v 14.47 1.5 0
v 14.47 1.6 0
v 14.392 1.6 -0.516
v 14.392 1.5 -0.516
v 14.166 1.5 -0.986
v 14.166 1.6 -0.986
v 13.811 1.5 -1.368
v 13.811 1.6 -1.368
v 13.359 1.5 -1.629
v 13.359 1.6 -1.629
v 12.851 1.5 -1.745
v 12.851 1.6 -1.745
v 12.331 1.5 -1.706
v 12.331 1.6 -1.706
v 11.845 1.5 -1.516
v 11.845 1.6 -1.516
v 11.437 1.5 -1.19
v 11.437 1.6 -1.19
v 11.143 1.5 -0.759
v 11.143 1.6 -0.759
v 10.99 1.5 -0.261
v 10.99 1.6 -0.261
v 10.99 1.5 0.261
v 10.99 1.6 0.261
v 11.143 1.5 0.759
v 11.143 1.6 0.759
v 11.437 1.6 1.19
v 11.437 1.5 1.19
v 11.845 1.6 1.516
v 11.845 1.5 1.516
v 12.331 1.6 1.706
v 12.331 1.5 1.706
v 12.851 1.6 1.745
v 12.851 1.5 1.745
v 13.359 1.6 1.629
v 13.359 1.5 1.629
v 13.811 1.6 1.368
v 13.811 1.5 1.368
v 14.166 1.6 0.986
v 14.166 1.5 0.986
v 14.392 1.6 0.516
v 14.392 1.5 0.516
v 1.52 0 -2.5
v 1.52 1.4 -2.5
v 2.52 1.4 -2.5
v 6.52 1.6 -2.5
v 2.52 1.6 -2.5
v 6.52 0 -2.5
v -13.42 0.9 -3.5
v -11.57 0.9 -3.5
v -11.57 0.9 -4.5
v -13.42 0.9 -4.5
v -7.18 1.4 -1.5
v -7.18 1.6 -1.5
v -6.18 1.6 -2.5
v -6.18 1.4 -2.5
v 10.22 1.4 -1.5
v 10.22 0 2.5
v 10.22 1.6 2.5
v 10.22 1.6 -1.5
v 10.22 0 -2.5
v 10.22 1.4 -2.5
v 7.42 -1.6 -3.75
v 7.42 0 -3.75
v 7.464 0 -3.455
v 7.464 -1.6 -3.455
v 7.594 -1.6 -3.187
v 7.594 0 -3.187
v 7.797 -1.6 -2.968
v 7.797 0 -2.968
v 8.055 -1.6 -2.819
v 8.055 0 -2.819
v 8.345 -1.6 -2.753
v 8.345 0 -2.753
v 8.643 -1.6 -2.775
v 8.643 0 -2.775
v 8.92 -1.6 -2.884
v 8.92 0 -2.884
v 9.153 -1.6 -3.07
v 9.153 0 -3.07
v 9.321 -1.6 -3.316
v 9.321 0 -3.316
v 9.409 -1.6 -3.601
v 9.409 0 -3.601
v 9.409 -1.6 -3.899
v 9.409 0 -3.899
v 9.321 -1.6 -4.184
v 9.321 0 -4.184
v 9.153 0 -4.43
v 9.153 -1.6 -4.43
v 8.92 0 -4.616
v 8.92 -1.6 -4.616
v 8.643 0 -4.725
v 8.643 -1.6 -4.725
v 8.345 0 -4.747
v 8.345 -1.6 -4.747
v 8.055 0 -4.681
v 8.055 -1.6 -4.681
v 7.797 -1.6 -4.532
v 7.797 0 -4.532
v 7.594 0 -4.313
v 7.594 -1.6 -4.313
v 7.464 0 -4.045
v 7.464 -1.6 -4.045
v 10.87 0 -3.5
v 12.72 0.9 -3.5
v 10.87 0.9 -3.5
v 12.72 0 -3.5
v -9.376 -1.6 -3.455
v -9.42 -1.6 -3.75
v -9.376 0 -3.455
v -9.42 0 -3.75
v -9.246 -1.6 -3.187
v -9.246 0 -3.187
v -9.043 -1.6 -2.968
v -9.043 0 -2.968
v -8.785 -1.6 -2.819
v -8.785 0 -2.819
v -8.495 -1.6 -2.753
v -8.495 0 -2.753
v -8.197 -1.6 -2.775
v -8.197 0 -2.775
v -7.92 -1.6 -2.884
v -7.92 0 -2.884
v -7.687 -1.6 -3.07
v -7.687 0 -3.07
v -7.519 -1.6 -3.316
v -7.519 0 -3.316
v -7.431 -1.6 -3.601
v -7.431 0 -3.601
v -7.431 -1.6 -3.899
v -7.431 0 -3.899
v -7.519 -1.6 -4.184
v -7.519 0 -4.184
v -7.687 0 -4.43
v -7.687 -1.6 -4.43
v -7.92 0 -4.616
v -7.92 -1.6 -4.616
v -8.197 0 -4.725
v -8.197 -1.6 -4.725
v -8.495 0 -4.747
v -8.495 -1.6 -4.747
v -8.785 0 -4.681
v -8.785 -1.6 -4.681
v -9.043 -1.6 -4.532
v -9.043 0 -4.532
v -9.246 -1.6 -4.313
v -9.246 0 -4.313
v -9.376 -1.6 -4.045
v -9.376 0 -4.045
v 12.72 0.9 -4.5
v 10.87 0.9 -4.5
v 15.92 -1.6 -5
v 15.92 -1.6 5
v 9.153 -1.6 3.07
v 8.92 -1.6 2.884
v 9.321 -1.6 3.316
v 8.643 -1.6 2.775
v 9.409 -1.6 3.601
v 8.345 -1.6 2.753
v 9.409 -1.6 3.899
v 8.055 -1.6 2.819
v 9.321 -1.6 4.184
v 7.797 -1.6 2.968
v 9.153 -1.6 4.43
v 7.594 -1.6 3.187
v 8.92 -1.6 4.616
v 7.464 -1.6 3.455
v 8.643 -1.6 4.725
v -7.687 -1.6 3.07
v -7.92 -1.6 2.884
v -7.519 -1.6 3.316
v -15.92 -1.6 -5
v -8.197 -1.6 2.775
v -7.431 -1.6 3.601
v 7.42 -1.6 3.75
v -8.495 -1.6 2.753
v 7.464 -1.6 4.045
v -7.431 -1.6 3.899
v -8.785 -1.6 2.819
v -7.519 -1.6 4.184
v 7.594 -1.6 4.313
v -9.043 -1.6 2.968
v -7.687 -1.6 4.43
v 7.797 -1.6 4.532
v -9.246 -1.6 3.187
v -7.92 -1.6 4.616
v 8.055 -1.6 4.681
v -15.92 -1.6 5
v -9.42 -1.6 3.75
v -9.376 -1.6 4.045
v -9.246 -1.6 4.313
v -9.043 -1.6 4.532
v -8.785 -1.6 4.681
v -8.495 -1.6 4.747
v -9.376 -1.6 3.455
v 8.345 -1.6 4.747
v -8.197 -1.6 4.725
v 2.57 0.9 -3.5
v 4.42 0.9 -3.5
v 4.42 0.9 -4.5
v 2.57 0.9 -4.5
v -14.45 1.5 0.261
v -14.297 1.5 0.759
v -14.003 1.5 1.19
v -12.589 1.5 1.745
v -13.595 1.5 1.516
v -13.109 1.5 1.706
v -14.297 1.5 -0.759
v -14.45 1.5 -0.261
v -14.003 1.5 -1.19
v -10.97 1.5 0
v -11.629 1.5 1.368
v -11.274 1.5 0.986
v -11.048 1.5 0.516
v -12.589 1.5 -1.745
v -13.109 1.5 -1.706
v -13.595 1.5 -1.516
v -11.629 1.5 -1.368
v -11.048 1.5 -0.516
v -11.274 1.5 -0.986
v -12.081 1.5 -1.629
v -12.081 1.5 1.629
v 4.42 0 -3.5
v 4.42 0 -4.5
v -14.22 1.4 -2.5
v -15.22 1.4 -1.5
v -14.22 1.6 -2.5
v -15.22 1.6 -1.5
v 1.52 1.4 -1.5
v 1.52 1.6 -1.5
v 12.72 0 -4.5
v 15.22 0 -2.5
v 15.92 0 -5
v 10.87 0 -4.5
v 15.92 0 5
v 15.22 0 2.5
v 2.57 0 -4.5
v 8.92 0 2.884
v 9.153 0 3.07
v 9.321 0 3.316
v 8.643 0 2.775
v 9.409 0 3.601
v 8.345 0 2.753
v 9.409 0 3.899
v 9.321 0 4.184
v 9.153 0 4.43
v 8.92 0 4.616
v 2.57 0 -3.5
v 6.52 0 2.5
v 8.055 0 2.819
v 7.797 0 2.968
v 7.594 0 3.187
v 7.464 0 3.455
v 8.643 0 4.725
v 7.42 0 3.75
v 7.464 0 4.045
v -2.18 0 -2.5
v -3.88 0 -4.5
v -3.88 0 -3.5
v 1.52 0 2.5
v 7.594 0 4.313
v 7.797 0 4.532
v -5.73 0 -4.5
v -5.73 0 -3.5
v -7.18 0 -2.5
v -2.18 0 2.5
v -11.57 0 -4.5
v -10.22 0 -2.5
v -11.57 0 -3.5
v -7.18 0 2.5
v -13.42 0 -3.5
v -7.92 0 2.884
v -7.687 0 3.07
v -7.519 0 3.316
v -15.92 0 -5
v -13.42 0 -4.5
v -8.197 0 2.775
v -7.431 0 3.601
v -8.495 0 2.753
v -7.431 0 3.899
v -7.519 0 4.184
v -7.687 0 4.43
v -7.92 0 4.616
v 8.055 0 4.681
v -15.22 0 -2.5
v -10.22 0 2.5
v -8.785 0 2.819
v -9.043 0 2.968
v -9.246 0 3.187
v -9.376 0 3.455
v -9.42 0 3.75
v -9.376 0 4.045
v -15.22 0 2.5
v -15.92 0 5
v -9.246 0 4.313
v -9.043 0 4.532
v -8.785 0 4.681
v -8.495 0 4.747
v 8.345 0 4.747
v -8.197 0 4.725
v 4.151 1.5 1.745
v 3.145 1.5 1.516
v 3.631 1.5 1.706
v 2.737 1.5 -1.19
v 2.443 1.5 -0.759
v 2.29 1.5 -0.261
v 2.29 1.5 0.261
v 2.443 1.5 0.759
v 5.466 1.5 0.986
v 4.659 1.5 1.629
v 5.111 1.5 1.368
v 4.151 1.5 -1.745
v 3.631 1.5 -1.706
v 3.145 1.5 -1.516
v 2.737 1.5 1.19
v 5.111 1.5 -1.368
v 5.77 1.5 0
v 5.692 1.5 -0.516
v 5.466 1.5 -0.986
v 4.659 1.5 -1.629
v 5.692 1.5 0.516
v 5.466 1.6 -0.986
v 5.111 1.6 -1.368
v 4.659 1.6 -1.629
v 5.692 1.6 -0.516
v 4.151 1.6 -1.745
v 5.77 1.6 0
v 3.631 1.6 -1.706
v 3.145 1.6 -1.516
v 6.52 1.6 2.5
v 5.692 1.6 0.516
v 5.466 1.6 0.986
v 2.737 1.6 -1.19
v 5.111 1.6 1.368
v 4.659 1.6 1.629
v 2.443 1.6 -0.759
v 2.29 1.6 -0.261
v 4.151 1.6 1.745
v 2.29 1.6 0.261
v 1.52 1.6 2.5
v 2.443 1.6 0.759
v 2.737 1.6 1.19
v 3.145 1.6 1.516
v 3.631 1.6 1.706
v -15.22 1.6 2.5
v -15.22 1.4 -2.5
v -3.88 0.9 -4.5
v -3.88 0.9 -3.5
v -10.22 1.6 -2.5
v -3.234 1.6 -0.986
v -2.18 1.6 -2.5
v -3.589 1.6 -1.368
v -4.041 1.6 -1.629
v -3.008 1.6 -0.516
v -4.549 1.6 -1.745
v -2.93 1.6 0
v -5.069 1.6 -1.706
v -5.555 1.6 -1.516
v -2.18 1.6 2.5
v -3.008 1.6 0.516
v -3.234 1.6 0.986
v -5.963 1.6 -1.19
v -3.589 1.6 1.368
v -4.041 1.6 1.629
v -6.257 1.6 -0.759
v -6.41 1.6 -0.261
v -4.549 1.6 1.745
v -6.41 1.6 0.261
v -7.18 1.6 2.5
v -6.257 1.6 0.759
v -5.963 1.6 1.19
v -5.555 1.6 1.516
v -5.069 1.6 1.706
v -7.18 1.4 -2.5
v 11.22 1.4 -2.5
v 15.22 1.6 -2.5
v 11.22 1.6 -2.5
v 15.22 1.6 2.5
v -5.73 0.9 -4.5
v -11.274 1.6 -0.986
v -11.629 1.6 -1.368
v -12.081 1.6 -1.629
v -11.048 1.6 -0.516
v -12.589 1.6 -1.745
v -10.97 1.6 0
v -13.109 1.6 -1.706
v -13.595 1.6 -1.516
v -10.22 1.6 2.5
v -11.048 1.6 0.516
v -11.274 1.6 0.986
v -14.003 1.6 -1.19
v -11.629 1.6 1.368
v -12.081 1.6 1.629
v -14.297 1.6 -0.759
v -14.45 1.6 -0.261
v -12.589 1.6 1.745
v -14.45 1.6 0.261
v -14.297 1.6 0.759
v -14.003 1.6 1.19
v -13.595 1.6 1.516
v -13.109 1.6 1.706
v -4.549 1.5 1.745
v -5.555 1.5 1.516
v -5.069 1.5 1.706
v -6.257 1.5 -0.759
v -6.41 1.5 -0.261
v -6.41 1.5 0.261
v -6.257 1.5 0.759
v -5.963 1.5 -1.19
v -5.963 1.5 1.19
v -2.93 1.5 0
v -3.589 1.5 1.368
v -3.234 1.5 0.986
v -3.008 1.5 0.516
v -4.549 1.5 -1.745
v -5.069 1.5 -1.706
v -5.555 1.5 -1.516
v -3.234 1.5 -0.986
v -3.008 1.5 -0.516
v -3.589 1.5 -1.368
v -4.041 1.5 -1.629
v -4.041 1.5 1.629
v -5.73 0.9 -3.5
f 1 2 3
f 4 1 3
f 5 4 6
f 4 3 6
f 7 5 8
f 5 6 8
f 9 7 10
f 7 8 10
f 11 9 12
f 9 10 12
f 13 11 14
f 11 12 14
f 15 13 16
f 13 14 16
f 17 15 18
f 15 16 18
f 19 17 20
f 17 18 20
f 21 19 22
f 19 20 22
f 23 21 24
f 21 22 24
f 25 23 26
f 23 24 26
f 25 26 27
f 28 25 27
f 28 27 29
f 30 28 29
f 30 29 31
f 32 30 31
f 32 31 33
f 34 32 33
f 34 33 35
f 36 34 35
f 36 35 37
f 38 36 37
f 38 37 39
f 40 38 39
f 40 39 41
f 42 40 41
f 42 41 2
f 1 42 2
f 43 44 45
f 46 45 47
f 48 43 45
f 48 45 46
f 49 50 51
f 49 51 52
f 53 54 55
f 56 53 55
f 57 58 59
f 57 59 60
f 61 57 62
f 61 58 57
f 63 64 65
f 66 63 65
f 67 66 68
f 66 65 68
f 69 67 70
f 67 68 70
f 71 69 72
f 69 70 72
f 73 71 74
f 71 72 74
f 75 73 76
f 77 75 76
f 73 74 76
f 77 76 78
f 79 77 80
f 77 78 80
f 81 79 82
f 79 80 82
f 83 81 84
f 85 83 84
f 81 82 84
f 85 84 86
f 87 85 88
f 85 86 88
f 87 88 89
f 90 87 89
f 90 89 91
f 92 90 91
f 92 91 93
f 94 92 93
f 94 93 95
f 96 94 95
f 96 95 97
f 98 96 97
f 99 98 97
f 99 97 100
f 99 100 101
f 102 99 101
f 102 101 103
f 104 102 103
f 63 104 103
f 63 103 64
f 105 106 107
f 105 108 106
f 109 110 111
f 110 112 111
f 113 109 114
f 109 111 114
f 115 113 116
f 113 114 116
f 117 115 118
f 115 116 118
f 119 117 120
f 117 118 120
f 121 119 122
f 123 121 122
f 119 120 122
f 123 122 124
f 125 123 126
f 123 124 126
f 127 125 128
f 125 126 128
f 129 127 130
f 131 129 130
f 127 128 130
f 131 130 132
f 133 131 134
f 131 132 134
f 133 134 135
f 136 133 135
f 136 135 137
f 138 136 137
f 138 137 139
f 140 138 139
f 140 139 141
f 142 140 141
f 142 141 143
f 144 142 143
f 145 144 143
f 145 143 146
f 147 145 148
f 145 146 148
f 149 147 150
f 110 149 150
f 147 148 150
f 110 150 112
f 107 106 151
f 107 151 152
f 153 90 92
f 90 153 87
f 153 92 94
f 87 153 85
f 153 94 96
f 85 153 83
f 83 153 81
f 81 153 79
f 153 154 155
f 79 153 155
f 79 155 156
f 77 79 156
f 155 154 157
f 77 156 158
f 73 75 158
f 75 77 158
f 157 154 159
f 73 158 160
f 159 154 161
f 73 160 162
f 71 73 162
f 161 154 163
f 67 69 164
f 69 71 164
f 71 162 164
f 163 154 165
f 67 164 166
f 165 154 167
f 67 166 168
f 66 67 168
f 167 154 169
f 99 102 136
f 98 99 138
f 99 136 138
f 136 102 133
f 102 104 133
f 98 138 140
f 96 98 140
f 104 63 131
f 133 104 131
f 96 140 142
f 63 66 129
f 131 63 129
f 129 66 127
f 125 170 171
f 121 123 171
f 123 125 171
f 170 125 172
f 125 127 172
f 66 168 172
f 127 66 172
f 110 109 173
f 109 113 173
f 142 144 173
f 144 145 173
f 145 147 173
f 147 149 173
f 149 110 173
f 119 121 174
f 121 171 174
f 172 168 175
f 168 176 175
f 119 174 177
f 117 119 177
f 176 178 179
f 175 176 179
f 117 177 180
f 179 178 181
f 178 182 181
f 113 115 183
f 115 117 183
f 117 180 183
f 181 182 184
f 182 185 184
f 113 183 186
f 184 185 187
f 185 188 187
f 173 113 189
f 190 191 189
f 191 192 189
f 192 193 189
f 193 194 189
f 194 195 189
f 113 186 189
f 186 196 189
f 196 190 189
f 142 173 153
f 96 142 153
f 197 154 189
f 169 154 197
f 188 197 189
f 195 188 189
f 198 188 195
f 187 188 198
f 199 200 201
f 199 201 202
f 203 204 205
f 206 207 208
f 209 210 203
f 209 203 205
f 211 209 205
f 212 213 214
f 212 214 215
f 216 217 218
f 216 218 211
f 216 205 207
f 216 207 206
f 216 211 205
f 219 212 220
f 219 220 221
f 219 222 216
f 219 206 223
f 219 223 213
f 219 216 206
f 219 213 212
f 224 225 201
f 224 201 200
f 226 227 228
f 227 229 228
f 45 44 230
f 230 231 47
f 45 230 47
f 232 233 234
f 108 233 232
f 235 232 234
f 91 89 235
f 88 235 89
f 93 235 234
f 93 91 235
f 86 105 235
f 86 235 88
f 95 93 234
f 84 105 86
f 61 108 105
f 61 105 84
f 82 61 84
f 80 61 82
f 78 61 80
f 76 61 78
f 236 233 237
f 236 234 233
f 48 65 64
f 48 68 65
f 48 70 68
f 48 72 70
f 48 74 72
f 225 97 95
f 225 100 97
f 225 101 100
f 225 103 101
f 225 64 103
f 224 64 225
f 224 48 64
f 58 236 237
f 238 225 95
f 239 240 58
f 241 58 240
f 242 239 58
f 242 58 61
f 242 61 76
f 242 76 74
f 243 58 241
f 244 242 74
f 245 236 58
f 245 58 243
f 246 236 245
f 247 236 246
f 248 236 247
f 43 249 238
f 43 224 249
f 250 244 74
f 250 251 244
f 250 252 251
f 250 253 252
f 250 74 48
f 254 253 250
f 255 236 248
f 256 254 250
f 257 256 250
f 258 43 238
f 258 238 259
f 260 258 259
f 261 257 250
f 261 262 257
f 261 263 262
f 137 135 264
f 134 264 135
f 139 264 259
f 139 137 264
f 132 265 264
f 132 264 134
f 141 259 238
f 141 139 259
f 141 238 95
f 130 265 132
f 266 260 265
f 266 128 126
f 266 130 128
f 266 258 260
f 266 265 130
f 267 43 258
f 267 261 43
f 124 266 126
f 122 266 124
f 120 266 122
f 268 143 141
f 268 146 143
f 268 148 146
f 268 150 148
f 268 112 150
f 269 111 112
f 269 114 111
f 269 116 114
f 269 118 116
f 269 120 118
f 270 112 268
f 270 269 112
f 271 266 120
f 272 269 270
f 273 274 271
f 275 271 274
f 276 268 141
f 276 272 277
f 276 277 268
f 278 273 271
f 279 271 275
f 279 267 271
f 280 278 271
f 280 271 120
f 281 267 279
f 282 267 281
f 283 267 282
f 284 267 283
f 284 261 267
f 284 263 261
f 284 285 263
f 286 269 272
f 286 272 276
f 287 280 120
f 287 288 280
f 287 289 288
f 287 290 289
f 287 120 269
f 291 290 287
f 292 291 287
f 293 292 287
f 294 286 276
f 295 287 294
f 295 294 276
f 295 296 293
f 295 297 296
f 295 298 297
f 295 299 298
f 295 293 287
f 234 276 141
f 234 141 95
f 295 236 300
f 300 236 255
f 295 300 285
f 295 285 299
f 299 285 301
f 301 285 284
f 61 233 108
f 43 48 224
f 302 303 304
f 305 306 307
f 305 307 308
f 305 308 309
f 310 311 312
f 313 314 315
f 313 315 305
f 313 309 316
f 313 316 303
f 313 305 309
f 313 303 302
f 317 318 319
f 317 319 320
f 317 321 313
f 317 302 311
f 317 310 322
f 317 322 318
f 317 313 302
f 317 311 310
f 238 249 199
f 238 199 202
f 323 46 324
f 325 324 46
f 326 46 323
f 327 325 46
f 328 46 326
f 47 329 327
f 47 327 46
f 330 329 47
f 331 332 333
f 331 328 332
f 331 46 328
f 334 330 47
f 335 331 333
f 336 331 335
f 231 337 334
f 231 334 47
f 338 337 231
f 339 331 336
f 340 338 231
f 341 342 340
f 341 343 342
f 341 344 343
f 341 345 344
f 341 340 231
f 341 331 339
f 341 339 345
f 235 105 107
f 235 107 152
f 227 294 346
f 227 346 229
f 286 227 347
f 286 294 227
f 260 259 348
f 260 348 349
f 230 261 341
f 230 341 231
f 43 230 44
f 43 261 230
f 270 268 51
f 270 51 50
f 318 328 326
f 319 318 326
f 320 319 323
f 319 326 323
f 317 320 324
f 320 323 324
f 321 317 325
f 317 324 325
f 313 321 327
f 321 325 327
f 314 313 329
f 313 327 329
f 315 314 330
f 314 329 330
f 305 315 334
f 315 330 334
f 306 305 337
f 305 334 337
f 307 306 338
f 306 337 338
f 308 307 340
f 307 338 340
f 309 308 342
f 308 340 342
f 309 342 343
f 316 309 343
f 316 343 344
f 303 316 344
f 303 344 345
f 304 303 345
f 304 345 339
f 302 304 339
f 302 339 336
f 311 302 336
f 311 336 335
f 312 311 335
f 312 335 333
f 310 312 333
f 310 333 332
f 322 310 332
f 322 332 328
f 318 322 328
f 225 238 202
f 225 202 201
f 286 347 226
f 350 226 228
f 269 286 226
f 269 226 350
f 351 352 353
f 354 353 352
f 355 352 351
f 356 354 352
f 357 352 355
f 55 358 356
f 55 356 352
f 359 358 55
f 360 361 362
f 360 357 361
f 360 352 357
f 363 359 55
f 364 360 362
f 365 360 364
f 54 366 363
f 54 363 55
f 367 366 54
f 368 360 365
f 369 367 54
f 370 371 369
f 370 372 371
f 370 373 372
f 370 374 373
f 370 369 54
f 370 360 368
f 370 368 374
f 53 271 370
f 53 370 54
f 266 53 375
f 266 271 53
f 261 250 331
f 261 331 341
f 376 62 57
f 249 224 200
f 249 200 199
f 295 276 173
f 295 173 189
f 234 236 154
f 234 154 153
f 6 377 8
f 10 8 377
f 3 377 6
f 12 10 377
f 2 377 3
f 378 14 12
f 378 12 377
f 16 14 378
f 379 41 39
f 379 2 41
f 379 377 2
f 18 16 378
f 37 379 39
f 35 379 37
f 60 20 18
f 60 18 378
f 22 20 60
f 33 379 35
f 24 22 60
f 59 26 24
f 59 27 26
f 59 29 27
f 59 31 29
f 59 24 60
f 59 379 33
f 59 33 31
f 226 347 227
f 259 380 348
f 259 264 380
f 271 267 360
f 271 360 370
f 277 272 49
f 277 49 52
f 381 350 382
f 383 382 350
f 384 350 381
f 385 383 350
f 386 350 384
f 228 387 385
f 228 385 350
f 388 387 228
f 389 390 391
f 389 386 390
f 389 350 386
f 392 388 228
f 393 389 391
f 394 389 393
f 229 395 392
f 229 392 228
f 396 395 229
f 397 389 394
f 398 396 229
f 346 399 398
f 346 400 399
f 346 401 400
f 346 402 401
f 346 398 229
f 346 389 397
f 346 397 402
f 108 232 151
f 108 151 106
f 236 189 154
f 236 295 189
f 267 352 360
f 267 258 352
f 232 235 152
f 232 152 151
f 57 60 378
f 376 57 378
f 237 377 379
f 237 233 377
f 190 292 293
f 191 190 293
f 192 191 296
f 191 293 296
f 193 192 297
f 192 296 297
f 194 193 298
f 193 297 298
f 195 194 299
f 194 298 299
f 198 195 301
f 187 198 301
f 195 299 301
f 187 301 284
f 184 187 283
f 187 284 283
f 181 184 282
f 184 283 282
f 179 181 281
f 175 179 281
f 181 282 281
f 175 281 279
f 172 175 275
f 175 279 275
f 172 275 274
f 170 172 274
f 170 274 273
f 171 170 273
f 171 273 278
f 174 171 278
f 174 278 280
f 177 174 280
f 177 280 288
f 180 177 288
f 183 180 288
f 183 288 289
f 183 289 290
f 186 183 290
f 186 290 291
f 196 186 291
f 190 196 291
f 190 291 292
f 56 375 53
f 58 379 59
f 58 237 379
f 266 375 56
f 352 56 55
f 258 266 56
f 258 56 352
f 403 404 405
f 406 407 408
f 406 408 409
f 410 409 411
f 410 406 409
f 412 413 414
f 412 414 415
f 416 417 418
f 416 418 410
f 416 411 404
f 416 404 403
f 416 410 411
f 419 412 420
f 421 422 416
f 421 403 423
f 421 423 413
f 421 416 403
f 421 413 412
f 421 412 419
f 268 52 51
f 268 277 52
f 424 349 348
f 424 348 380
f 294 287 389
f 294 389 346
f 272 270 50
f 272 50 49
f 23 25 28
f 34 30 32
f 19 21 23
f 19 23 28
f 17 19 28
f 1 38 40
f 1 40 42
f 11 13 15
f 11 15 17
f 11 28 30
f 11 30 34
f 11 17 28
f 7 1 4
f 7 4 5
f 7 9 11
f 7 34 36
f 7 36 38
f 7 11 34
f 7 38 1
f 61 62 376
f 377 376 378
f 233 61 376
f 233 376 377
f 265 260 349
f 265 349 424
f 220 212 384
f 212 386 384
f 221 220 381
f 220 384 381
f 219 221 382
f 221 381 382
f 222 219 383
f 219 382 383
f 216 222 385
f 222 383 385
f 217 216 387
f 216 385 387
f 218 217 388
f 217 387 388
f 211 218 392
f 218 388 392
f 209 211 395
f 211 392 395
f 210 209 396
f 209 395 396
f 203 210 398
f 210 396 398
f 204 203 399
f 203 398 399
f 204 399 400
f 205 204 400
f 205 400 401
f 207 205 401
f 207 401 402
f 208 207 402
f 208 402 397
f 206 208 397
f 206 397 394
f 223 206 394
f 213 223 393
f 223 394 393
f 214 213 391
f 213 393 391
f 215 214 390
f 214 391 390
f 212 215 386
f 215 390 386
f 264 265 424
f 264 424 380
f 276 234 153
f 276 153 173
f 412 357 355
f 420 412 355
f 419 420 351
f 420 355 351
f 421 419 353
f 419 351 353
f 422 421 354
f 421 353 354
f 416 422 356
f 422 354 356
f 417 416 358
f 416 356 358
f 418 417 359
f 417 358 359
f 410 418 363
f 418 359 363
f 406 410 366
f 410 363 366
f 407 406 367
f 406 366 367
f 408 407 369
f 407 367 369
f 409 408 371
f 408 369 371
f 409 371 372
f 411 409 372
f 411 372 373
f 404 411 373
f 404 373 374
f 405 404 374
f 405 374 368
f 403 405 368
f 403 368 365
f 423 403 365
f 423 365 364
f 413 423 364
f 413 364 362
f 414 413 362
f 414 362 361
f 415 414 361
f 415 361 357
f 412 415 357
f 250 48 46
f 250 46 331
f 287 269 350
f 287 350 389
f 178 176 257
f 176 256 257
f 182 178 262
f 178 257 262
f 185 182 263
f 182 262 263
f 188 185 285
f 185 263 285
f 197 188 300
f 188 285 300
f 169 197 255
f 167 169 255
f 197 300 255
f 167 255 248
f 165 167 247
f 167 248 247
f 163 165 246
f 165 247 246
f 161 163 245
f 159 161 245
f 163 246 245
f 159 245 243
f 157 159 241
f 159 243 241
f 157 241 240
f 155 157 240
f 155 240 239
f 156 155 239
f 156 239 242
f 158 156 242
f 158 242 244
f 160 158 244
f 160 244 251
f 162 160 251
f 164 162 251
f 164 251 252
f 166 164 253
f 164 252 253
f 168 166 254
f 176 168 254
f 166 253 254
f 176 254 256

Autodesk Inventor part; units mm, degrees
ref_plane "YZ Plane" through (0, 0, 0) normal (1, 0, 0) x (0, 1, 0)
ref_plane "XZ Plane" through (0, 0, 0) normal (0, 1, 0) x (-1, 0, 0)
sketch "Sketch1" plane through (0, 0, 0) normal (0, 1, 0) x (-1, 0, 0)
  line L0 (15.92, 5) -> (-15.92, 5)
  line L1 (-15.92, 5) -> (-15.92, -5)
  line L2 (-15.92, -5) -> (15.92, -5)
  line L3 (15.92, -5) -> (15.92, 5)
  line L4 (15.92, 5) -> (-15.92, -5) construction
  line L5 (-15.92, 5) -> (15.92, -5) construction
  line L6 (-10.87, -4.5) -> (-12.72, -4.5)
  line L7 (-12.72, -4.5) -> (-12.72, -3.5)
  line L8 (-12.72, -3.5) -> (-10.87, -3.5)
  line L9 (-10.87, -3.5) -> (-10.87, -4.5)
  circle A0 centre (-8.42, -3.75) radius 1
  line L10 (15.92, 0) -> (-15.92, 0) construction
  line L11 (0, -5) -> (0, 5) construction
  circle A1 centre (-8.42, 3.75) radius 1
  line L12 (-10.22, -2.5) -> (-15.22, -2.5)
  line L13 (-15.22, -2.5) -> (-15.22, 2.5)
  line L14 (-15.22, 2.5) -> (-10.22, 2.5)
  line L15 (-10.22, 2.5) -> (-10.22, -2.5)
  line L16 (-1.52, -2.5) -> (-6.52, -2.5)
  line L17 (-6.52, -2.5) -> (-6.52, 2.5)
  line L18 (-6.52, 2.5) -> (-1.52, 2.5)
  line L19 (-1.52, 2.5) -> (-1.52, -2.5)
  line L20 (7.18, -2.5) -> (2.18, -2.5)
  line L21 (2.18, -2.5) -> (2.18, 2.5)
  line L22 (2.18, 2.5) -> (7.18, 2.5)
  line L23 (7.18, 2.5) -> (7.18, -2.5)
  line L24 (15.22, -2.5) -> (10.22, -2.5)
  line L25 (10.22, -2.5) -> (10.22, 2.5)
  line L26 (10.22, 2.5) -> (15.22, 2.5)
  line L27 (15.22, 2.5) -> (15.22, -2.5)
  circle A2 centre (8.42, -3.75) radius 1
  circle A3 centre (8.42, 3.75) radius 1
  line L28 (-2.57, -4.5) -> (-4.42, -4.5)
  line L29 (-4.42, -4.5) -> (-4.42, -3.5)
  line L30 (-4.42, -3.5) -> (-2.57, -3.5)
  line L31 (-2.57, -3.5) -> (-2.57, -4.5)
  line L32 (5.73, -4.5) -> (3.88, -4.5)
  line L33 (3.88, -4.5) -> (3.88, -3.5)
  line L34 (3.88, -3.5) -> (5.73, -3.5)
  line L35 (5.73, -3.5) -> (5.73, -4.5)
  line L36 (13.42, -4.5) -> (11.57, -4.5)
  line L37 (11.57, -4.5) -> (11.57, -3.5)
  line L38 (11.57, -3.5) -> (13.42, -3.5)
  line L39 (13.42, -3.5) -> (13.42, -4.5)
  point P0 (0, 0)
  dimension "d0" = 31.84
  dimension "d1" = 10
  dimension "d2" = 1.85
  dimension "d3" = 1
  dimension "d4" = 7.5
  dimension "d5" = 7.5
  dimension "d6" = 2
  dimension "d7" = 3.2
  dimension "d8" = 0.5
  dimension "d9" = 5
  dimension "d10" = 0.7
  dimension "d11" = 3.7
  dimension "d12" = 0.7
  dimension "d14" = 6.45
  dimension "d15" = 6.45
  dimension "d16" = 2.5
  dimension "d18" = 3.7
extrude "Extrusion1" add sketch "Sketch1" against normal blind 1.6 contours L3 L2 L1 L0 | L6 L7 L8 L9 | L12 L13 L14 L15 | L16 L17 L18 L19 | L20 L21 L22 L23 | L24 L25 L26 L27 | L28 L29 L30 L31 | L32 L33 L34 L35 | L36 L37 L38 L39
extrude "Extrusion2" add sketch "Sketch1" along normal blind 1.6 contours L12 L13 L14 L15 | L16 L17 L18 L19 | L20 L21 L22 L23 | L24 L25 L26 L27
extrude "Extrusion3" add sketch "Sketch1" along normal blind 0.9 contours L6 L7 L8 L9 | L28 L29 L30 L31 | L32 L33 L34 L35 | L36 L37 L38 L39
sketch "Sketch2" plane through (0, 1.6, 0) normal (0, 1, 0) x (1, 0, 0)
  line L0 (-10.22, 2.5) -> (-15.22, 2.5) construction
  line L1 (-15.22, 2.5) -> (-15.22, -2.5) construction
  line L2 (-15.22, -2.5) -> (-10.22, -2.5) construction
  line L3 (-10.22, -2.5) -> (-10.22, 2.5) construction
  line L4 (-7.18, 2.5) -> (-7.18, -2.5) construction
  line L5 (-7.18, -2.5) -> (-2.18, -2.5) construction
  line L6 (-2.18, -2.5) -> (-2.18, 2.5) construction
  line L7 (-2.18, 2.5) -> (-7.18, 2.5) construction
  line L8 (6.52, 2.5) -> (1.52, 2.5) construction
  line L9 (1.52, 2.5) -> (1.52, -2.5) construction
  line L10 (1.52, -2.5) -> (6.52, -2.5) construction
  line L11 (6.52, -2.5) -> (6.52, 2.5) construction
  line L12 (10.22, 2.5) -> (10.22, -2.5) construction
  line L13 (10.22, -2.5) -> (15.22, -2.5) construction
  line L14 (15.22, -2.5) -> (15.22, 2.5) construction
  line L15 (15.22, 2.5) -> (10.22, 2.5) construction
  circle A0 centre (-12.72, 0) radius 1.75
  circle A1 centre (-4.68, 0) radius 1.75
  circle A2 centre (4.02, 0) radius 1.75
  circle A3 centre (12.72, 0) radius 1.75
  line L16 (-15.22, -2.5) -> (-15.22, 2.5) construction
  line L17 (-15.22, 1.5) -> (-14.22, 2.5)
  line L18 (-15.22, 2.5) -> (-10.22, 2.5) construction
  line L19 (-15.22, 2.5) -> (-15.22, 1.5)
  line L20 (-15.22, 2.5) -> (-14.22, 2.5)
  line L21 (-7.18, 2.5) -> (-7.18, 1.5)
  line L22 (-7.18, -2.5) -> (-7.18, 2.5) construction
  line L23 (-7.18, 2.5) -> (-2.18, 2.5) construction
  line L24 (-7.18, 2.5) -> (-6.18, 2.5)
  line L25 (-7.18, 1.5) -> (-6.18, 2.5)
  line L26 (1.52, 2.5) -> (1.52, 1.5)
  line L27 (1.52, 1.5) -> (2.52, 2.5)
  line L28 (1.52, -2.5) -> (1.52, 2.5) construction
  line L29 (2.52, 2.5) -> (1.52, 2.5)
  line L30 (10.22, 2.5) -> (10.22, 1.5)
  line L31 (10.22, -2.5) -> (10.22, 2.5) construction
  line L32 (10.22, 2.5) -> (15.22, 2.5) construction
  line L33 (10.22, 2.5) -> (11.22, 2.5)
  line L34 (10.22, 1.5) -> (11.22, 2.5)
  point P0 (0, 0)
  dimension "d25" = 3.5
  dimension "d26" = 45
  dimension "d27" = 1
extrude "Extrusion4" cut sketch "Sketch2" against normal blind 0.2 contours L19 L20 L17 | L24 L25 L21 | L29 L27 L26 | L33 L34 L30
extrude "Extrusion5" cut sketch "Sketch2" against normal blind 0.8 contours A0 | A1 | A2 | A3
ref_plane "Work Plane1" through (0, 1.5, 0) normal (0, 1, 0) x (1, 0, 0)
sketch "Sketch3" plane through (0, 1.5, 0) normal (0, 1, 0) x (1, 0, 0)
  circle A0 centre (-12.72, 0) radius 1.75 projected
  circle A1 centre (-4.68, 0) radius 1.75 projected
  circle A2 centre (4.02, 0) radius 1.75 projected
  circle A3 centre (12.72, 0) radius 1.75 projected
  point P0 (0, 0)
extrude "Extrusion7" add sketch "Sketch3" against normal up to next
equation "\"d12\" = d10"
equation "\"d15\" = d14"
equation "\"d18\" = d11"
properties part number "LED WS2812B"
